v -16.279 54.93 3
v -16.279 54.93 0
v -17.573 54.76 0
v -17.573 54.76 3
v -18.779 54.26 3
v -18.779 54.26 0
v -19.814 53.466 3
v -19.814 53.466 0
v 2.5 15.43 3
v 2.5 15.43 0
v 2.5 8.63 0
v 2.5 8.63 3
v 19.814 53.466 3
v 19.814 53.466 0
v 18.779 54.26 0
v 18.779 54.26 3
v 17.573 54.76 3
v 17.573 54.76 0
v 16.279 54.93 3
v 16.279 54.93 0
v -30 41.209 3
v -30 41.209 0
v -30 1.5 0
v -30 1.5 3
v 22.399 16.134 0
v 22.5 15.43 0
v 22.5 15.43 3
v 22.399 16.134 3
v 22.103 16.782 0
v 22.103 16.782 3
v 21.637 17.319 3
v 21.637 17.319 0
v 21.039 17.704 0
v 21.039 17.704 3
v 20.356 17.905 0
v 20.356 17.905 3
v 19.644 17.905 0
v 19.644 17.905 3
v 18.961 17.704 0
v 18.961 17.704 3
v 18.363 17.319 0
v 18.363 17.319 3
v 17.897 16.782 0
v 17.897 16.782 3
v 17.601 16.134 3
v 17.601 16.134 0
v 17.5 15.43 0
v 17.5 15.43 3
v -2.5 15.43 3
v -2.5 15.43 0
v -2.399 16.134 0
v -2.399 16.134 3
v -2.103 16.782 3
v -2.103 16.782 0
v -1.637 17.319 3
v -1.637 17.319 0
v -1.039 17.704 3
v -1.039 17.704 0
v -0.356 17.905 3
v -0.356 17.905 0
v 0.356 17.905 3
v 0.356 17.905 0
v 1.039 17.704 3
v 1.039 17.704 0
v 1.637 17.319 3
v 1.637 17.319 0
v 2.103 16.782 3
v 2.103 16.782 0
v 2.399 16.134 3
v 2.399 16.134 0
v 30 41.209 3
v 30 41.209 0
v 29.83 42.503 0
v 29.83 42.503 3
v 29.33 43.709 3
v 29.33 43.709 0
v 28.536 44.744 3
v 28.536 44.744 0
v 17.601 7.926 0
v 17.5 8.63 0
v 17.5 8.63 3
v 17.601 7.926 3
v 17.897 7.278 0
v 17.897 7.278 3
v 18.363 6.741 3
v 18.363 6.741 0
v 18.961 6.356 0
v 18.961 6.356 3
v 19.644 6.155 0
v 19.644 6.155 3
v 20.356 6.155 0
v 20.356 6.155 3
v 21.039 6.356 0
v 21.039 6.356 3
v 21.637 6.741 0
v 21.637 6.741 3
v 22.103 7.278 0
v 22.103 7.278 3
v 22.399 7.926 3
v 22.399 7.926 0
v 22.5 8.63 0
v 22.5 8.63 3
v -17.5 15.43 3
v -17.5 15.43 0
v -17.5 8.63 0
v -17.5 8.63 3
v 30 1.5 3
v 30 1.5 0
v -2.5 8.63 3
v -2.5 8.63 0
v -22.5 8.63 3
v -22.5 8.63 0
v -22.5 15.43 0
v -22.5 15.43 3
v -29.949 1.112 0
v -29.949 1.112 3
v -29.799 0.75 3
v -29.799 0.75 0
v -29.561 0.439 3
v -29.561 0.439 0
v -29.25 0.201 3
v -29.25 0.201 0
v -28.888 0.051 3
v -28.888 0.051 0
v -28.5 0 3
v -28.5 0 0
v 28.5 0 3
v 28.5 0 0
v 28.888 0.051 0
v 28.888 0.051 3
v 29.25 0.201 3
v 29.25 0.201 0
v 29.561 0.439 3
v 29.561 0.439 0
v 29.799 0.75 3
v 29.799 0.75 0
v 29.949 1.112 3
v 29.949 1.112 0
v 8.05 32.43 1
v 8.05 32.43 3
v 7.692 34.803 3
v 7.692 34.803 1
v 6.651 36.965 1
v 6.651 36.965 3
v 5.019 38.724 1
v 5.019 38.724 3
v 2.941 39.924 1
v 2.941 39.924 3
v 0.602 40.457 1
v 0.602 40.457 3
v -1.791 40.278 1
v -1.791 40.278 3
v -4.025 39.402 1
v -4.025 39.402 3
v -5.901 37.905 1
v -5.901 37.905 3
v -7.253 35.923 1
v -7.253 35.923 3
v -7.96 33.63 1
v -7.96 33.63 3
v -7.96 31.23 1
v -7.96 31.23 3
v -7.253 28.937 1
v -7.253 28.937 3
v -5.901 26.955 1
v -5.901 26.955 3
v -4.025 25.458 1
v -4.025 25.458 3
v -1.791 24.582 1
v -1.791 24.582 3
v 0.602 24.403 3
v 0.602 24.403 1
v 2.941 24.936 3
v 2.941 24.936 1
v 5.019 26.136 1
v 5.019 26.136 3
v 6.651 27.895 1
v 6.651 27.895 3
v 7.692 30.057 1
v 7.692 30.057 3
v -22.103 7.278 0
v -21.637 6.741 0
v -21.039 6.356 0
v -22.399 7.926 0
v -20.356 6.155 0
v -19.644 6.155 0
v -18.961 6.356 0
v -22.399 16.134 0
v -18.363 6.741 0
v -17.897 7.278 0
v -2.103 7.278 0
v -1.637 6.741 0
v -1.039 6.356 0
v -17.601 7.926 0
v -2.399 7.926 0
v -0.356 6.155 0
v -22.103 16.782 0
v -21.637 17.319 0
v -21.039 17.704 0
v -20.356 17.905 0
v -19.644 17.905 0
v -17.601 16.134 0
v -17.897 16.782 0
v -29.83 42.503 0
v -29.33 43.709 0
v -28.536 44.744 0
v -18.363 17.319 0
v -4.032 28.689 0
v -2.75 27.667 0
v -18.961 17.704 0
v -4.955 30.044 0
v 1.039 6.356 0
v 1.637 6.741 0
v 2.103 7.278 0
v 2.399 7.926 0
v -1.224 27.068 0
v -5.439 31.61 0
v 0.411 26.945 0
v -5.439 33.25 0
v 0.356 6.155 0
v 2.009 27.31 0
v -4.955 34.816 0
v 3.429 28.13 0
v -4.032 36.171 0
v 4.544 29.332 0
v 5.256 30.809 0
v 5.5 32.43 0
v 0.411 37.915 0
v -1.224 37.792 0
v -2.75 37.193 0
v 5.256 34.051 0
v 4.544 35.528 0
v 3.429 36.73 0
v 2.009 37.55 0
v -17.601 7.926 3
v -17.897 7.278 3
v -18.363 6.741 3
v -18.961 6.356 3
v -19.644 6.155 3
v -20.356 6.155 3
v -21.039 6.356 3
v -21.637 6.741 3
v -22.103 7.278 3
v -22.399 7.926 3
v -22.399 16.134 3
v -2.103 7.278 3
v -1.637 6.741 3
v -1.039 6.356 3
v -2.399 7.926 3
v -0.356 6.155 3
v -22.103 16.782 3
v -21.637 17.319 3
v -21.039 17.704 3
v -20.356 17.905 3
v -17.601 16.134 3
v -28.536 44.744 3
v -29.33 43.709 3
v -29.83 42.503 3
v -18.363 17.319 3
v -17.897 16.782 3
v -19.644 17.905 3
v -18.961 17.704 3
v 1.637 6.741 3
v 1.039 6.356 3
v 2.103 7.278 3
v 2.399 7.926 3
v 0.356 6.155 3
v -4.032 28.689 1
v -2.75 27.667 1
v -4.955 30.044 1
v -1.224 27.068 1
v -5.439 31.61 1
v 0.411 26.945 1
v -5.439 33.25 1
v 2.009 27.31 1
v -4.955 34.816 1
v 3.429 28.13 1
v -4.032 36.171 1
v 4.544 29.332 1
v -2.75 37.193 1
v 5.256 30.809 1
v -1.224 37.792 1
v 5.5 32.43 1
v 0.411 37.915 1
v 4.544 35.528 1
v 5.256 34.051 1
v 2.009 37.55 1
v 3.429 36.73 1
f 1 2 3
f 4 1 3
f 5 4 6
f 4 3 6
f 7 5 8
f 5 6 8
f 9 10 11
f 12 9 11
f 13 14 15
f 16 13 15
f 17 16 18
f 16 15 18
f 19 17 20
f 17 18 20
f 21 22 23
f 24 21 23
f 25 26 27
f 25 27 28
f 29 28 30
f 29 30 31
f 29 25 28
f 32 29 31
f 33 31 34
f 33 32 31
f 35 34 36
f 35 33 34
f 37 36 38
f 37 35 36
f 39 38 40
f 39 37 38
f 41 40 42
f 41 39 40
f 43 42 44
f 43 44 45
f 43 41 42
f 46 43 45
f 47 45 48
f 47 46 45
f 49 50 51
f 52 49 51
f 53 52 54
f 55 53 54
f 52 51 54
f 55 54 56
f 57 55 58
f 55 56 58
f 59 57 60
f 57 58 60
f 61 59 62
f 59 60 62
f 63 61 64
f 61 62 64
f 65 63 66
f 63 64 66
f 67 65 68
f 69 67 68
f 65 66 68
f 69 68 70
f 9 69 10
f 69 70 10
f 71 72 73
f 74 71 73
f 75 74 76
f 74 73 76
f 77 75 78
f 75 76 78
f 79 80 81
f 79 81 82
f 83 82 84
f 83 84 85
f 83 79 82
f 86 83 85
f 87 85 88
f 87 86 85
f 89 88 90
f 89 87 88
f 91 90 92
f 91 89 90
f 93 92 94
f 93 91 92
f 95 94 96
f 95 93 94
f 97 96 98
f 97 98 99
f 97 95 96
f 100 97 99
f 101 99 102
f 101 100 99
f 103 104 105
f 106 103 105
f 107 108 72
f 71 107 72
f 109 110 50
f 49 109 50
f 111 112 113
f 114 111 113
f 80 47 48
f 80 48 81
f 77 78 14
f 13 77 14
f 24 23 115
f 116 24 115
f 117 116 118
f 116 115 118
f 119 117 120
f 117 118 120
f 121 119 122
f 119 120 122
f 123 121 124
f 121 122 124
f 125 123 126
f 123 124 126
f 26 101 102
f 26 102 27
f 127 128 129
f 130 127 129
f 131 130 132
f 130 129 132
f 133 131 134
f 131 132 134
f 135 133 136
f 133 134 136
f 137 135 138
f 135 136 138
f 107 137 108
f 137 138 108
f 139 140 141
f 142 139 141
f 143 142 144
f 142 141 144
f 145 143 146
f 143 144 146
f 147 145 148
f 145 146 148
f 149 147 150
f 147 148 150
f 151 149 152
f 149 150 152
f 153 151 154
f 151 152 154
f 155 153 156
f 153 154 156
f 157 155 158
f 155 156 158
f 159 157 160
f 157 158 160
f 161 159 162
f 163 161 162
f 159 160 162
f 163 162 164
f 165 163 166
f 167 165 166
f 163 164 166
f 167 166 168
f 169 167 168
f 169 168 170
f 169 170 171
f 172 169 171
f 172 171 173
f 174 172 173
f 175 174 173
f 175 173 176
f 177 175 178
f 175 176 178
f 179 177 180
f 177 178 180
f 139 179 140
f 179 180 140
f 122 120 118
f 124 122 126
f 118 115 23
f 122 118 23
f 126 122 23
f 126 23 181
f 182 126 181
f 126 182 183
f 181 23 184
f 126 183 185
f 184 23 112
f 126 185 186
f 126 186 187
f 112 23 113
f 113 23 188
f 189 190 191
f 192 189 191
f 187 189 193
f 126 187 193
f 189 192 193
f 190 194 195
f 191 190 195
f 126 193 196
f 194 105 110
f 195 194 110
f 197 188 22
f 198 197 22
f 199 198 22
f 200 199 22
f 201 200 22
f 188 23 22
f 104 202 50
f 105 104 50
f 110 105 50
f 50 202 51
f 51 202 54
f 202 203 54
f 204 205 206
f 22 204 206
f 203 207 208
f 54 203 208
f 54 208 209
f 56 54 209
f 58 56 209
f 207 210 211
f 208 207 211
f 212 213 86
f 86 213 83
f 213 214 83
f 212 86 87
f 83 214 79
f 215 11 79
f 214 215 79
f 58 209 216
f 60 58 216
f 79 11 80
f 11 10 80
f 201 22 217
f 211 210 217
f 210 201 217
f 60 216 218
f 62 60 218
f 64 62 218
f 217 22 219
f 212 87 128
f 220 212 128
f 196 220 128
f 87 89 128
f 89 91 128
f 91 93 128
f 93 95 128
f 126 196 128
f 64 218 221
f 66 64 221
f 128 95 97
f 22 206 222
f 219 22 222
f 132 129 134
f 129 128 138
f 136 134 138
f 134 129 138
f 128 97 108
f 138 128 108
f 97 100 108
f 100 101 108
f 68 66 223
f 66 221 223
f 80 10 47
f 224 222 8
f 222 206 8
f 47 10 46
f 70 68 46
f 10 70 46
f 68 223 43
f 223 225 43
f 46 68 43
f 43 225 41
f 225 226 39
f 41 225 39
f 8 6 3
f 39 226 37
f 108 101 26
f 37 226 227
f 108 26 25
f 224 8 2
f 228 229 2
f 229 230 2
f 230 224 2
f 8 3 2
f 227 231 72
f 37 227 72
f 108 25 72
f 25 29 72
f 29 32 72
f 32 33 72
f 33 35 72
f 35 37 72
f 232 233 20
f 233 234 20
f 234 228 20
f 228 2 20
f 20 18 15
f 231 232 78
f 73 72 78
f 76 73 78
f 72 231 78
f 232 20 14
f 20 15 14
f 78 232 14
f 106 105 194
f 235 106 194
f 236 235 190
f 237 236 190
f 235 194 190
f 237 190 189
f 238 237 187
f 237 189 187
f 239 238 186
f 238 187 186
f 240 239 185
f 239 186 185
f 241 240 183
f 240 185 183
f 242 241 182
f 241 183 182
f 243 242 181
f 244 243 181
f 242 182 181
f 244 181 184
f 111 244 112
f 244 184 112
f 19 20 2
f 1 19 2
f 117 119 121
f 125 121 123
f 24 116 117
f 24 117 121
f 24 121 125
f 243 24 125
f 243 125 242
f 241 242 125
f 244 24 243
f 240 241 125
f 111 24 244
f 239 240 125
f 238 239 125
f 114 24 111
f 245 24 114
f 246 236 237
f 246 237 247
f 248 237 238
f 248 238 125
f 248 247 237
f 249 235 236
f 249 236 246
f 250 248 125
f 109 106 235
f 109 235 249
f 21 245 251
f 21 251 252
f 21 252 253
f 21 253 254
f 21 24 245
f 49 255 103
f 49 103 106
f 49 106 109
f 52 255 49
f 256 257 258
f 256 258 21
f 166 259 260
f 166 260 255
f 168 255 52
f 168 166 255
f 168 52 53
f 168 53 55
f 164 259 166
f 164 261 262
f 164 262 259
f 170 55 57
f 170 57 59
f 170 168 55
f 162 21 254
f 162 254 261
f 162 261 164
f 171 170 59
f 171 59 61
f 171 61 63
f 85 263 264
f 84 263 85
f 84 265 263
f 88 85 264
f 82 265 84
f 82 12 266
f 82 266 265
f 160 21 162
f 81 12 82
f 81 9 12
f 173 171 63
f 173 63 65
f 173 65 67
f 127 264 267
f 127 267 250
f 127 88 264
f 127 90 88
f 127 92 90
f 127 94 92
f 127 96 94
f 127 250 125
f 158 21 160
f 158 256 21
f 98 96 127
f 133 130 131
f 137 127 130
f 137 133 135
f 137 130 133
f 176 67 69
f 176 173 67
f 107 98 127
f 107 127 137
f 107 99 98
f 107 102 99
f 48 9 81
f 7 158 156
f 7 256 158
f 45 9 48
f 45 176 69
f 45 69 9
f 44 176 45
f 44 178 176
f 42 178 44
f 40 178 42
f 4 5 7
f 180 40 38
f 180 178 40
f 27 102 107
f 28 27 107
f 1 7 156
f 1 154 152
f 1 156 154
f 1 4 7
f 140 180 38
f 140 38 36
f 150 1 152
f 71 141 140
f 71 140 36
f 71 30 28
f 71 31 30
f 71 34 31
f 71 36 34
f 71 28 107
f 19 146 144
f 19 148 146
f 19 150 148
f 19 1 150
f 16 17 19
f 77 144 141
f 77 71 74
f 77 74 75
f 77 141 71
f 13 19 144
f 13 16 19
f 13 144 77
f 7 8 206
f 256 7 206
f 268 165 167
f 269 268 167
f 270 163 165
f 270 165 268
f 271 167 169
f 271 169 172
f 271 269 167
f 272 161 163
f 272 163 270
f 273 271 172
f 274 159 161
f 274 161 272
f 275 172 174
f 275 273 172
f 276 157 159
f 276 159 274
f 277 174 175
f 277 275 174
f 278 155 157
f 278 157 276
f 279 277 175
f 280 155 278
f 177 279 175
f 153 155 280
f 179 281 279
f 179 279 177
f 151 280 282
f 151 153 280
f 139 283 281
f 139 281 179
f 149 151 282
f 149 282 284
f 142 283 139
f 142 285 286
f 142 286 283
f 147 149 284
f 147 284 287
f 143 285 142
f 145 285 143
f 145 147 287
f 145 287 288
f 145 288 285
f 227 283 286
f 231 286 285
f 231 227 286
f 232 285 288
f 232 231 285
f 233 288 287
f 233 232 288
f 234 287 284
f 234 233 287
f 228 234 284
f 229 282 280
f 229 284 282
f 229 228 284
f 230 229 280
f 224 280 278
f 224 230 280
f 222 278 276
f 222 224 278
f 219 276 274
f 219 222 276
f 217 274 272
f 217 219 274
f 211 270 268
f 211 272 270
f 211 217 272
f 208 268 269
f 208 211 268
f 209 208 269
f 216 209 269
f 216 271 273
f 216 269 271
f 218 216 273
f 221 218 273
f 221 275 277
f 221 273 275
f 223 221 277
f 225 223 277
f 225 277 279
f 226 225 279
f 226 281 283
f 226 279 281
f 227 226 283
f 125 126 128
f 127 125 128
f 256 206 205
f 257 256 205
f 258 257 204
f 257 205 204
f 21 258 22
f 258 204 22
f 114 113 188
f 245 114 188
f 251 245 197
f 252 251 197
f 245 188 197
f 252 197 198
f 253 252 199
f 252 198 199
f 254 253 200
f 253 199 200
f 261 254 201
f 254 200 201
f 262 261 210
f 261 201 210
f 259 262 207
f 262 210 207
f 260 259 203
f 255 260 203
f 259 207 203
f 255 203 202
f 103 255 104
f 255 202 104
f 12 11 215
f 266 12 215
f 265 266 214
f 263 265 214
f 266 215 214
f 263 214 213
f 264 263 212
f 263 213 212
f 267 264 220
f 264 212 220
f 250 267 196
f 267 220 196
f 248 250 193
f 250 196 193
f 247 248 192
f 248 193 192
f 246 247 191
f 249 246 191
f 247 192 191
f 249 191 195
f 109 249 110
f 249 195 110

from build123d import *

# Parameters (mm, degrees)
MODEL_R             = 5.5
BOSS_EXTRUDE1_DEPTH = 3
SKETCH2_R           = 8.05
CUT_EXTRUDE1_DEPTH  = 2


with BuildPart() as part:
    # Model → Boss-Extrude1 (new body)
    with BuildSketch(Plane.XY):
        with BuildLine():
            Line((-19.814466094, 53.465533906), (-28.535533906, 44.744466094))
            ThreePointArc((-28.535533906, 44.744466094), (-29.619397663, 43.12234935), (-30, 41.208932188))
            Line((-30, 41.208932188), (-30, 1.5))
            ThreePointArc((-30, 1.5), (-29.560660172, 0.439339828), (-28.5, 0))
            Line((-28.5, 0), (28.5, 0))
            ThreePointArc((28.5, 0), (29.560660172, 0.439339828), (30, 1.5))
            Line((30, 1.5), (30, 41.208932188))
            ThreePointArc((30, 41.208932188), (29.619397663, 43.12234935), (28.535533906, 44.744466094))
            Line((28.535533906, 44.744466094), (19.814466094, 53.465533906))
            ThreePointArc((19.814466094, 53.465533906), (18.19234935, 54.549397663), (16.278932188, 54.93))
            Line((16.278932188, 54.93), (-16.278932188, 54.93))
            ThreePointArc((-16.278932188, 54.93), (-18.19234935, 54.549397663), (-19.814466094, 53.465533906))
        make_face()
        with Locations((0, 32.43)):
            Circle(MODEL_R, mode=Mode.SUBTRACT)
        with BuildLine():
            Line((22.5, 8.63), (22.5, 15.43))
            ThreePointArc((22.5, 15.43), (20, 17.93), (17.5, 15.43))
            Line((17.5, 15.43), (17.5, 8.63))
            ThreePointArc((17.5, 8.63), (20, 6.13), (22.5, 8.63))
        make_face(mode=Mode.SUBTRACT)
        with BuildLine():
            Line((-22.5, 8.63), (-22.5, 15.43))
            ThreePointArc((-22.5, 15.43), (-20, 17.93), (-17.5, 15.43))
            Line((-17.5, 15.43), (-17.5, 8.63))
            ThreePointArc((-17.5, 8.63), (-20, 6.13), (-22.5, 8.63))
        make_face(mode=Mode.SUBTRACT)
        with BuildLine():
            Line((-2.5, 8.63), (-2.5, 15.43))
            ThreePointArc((-2.5, 15.43), (0, 17.93), (2.5, 15.43))
            Line((2.5, 15.43), (2.5, 8.63))
            ThreePointArc((2.5, 8.63), (0, 6.13), (-2.5, 8.63))
        make_face(mode=Mode.SUBTRACT)
    extrude(amount=BOSS_EXTRUDE1_DEPTH)

    # Sketch2 → Cut-Extrude1 (cut)
    with BuildSketch(Plane.XY.offset(3)):
        with Locations((0, 32.43)):
            Circle(SKETCH2_R)
    extrude(amount=-CUT_EXTRUDE1_DEPTH, mode=Mode.SUBTRACT)


solid = part.part
